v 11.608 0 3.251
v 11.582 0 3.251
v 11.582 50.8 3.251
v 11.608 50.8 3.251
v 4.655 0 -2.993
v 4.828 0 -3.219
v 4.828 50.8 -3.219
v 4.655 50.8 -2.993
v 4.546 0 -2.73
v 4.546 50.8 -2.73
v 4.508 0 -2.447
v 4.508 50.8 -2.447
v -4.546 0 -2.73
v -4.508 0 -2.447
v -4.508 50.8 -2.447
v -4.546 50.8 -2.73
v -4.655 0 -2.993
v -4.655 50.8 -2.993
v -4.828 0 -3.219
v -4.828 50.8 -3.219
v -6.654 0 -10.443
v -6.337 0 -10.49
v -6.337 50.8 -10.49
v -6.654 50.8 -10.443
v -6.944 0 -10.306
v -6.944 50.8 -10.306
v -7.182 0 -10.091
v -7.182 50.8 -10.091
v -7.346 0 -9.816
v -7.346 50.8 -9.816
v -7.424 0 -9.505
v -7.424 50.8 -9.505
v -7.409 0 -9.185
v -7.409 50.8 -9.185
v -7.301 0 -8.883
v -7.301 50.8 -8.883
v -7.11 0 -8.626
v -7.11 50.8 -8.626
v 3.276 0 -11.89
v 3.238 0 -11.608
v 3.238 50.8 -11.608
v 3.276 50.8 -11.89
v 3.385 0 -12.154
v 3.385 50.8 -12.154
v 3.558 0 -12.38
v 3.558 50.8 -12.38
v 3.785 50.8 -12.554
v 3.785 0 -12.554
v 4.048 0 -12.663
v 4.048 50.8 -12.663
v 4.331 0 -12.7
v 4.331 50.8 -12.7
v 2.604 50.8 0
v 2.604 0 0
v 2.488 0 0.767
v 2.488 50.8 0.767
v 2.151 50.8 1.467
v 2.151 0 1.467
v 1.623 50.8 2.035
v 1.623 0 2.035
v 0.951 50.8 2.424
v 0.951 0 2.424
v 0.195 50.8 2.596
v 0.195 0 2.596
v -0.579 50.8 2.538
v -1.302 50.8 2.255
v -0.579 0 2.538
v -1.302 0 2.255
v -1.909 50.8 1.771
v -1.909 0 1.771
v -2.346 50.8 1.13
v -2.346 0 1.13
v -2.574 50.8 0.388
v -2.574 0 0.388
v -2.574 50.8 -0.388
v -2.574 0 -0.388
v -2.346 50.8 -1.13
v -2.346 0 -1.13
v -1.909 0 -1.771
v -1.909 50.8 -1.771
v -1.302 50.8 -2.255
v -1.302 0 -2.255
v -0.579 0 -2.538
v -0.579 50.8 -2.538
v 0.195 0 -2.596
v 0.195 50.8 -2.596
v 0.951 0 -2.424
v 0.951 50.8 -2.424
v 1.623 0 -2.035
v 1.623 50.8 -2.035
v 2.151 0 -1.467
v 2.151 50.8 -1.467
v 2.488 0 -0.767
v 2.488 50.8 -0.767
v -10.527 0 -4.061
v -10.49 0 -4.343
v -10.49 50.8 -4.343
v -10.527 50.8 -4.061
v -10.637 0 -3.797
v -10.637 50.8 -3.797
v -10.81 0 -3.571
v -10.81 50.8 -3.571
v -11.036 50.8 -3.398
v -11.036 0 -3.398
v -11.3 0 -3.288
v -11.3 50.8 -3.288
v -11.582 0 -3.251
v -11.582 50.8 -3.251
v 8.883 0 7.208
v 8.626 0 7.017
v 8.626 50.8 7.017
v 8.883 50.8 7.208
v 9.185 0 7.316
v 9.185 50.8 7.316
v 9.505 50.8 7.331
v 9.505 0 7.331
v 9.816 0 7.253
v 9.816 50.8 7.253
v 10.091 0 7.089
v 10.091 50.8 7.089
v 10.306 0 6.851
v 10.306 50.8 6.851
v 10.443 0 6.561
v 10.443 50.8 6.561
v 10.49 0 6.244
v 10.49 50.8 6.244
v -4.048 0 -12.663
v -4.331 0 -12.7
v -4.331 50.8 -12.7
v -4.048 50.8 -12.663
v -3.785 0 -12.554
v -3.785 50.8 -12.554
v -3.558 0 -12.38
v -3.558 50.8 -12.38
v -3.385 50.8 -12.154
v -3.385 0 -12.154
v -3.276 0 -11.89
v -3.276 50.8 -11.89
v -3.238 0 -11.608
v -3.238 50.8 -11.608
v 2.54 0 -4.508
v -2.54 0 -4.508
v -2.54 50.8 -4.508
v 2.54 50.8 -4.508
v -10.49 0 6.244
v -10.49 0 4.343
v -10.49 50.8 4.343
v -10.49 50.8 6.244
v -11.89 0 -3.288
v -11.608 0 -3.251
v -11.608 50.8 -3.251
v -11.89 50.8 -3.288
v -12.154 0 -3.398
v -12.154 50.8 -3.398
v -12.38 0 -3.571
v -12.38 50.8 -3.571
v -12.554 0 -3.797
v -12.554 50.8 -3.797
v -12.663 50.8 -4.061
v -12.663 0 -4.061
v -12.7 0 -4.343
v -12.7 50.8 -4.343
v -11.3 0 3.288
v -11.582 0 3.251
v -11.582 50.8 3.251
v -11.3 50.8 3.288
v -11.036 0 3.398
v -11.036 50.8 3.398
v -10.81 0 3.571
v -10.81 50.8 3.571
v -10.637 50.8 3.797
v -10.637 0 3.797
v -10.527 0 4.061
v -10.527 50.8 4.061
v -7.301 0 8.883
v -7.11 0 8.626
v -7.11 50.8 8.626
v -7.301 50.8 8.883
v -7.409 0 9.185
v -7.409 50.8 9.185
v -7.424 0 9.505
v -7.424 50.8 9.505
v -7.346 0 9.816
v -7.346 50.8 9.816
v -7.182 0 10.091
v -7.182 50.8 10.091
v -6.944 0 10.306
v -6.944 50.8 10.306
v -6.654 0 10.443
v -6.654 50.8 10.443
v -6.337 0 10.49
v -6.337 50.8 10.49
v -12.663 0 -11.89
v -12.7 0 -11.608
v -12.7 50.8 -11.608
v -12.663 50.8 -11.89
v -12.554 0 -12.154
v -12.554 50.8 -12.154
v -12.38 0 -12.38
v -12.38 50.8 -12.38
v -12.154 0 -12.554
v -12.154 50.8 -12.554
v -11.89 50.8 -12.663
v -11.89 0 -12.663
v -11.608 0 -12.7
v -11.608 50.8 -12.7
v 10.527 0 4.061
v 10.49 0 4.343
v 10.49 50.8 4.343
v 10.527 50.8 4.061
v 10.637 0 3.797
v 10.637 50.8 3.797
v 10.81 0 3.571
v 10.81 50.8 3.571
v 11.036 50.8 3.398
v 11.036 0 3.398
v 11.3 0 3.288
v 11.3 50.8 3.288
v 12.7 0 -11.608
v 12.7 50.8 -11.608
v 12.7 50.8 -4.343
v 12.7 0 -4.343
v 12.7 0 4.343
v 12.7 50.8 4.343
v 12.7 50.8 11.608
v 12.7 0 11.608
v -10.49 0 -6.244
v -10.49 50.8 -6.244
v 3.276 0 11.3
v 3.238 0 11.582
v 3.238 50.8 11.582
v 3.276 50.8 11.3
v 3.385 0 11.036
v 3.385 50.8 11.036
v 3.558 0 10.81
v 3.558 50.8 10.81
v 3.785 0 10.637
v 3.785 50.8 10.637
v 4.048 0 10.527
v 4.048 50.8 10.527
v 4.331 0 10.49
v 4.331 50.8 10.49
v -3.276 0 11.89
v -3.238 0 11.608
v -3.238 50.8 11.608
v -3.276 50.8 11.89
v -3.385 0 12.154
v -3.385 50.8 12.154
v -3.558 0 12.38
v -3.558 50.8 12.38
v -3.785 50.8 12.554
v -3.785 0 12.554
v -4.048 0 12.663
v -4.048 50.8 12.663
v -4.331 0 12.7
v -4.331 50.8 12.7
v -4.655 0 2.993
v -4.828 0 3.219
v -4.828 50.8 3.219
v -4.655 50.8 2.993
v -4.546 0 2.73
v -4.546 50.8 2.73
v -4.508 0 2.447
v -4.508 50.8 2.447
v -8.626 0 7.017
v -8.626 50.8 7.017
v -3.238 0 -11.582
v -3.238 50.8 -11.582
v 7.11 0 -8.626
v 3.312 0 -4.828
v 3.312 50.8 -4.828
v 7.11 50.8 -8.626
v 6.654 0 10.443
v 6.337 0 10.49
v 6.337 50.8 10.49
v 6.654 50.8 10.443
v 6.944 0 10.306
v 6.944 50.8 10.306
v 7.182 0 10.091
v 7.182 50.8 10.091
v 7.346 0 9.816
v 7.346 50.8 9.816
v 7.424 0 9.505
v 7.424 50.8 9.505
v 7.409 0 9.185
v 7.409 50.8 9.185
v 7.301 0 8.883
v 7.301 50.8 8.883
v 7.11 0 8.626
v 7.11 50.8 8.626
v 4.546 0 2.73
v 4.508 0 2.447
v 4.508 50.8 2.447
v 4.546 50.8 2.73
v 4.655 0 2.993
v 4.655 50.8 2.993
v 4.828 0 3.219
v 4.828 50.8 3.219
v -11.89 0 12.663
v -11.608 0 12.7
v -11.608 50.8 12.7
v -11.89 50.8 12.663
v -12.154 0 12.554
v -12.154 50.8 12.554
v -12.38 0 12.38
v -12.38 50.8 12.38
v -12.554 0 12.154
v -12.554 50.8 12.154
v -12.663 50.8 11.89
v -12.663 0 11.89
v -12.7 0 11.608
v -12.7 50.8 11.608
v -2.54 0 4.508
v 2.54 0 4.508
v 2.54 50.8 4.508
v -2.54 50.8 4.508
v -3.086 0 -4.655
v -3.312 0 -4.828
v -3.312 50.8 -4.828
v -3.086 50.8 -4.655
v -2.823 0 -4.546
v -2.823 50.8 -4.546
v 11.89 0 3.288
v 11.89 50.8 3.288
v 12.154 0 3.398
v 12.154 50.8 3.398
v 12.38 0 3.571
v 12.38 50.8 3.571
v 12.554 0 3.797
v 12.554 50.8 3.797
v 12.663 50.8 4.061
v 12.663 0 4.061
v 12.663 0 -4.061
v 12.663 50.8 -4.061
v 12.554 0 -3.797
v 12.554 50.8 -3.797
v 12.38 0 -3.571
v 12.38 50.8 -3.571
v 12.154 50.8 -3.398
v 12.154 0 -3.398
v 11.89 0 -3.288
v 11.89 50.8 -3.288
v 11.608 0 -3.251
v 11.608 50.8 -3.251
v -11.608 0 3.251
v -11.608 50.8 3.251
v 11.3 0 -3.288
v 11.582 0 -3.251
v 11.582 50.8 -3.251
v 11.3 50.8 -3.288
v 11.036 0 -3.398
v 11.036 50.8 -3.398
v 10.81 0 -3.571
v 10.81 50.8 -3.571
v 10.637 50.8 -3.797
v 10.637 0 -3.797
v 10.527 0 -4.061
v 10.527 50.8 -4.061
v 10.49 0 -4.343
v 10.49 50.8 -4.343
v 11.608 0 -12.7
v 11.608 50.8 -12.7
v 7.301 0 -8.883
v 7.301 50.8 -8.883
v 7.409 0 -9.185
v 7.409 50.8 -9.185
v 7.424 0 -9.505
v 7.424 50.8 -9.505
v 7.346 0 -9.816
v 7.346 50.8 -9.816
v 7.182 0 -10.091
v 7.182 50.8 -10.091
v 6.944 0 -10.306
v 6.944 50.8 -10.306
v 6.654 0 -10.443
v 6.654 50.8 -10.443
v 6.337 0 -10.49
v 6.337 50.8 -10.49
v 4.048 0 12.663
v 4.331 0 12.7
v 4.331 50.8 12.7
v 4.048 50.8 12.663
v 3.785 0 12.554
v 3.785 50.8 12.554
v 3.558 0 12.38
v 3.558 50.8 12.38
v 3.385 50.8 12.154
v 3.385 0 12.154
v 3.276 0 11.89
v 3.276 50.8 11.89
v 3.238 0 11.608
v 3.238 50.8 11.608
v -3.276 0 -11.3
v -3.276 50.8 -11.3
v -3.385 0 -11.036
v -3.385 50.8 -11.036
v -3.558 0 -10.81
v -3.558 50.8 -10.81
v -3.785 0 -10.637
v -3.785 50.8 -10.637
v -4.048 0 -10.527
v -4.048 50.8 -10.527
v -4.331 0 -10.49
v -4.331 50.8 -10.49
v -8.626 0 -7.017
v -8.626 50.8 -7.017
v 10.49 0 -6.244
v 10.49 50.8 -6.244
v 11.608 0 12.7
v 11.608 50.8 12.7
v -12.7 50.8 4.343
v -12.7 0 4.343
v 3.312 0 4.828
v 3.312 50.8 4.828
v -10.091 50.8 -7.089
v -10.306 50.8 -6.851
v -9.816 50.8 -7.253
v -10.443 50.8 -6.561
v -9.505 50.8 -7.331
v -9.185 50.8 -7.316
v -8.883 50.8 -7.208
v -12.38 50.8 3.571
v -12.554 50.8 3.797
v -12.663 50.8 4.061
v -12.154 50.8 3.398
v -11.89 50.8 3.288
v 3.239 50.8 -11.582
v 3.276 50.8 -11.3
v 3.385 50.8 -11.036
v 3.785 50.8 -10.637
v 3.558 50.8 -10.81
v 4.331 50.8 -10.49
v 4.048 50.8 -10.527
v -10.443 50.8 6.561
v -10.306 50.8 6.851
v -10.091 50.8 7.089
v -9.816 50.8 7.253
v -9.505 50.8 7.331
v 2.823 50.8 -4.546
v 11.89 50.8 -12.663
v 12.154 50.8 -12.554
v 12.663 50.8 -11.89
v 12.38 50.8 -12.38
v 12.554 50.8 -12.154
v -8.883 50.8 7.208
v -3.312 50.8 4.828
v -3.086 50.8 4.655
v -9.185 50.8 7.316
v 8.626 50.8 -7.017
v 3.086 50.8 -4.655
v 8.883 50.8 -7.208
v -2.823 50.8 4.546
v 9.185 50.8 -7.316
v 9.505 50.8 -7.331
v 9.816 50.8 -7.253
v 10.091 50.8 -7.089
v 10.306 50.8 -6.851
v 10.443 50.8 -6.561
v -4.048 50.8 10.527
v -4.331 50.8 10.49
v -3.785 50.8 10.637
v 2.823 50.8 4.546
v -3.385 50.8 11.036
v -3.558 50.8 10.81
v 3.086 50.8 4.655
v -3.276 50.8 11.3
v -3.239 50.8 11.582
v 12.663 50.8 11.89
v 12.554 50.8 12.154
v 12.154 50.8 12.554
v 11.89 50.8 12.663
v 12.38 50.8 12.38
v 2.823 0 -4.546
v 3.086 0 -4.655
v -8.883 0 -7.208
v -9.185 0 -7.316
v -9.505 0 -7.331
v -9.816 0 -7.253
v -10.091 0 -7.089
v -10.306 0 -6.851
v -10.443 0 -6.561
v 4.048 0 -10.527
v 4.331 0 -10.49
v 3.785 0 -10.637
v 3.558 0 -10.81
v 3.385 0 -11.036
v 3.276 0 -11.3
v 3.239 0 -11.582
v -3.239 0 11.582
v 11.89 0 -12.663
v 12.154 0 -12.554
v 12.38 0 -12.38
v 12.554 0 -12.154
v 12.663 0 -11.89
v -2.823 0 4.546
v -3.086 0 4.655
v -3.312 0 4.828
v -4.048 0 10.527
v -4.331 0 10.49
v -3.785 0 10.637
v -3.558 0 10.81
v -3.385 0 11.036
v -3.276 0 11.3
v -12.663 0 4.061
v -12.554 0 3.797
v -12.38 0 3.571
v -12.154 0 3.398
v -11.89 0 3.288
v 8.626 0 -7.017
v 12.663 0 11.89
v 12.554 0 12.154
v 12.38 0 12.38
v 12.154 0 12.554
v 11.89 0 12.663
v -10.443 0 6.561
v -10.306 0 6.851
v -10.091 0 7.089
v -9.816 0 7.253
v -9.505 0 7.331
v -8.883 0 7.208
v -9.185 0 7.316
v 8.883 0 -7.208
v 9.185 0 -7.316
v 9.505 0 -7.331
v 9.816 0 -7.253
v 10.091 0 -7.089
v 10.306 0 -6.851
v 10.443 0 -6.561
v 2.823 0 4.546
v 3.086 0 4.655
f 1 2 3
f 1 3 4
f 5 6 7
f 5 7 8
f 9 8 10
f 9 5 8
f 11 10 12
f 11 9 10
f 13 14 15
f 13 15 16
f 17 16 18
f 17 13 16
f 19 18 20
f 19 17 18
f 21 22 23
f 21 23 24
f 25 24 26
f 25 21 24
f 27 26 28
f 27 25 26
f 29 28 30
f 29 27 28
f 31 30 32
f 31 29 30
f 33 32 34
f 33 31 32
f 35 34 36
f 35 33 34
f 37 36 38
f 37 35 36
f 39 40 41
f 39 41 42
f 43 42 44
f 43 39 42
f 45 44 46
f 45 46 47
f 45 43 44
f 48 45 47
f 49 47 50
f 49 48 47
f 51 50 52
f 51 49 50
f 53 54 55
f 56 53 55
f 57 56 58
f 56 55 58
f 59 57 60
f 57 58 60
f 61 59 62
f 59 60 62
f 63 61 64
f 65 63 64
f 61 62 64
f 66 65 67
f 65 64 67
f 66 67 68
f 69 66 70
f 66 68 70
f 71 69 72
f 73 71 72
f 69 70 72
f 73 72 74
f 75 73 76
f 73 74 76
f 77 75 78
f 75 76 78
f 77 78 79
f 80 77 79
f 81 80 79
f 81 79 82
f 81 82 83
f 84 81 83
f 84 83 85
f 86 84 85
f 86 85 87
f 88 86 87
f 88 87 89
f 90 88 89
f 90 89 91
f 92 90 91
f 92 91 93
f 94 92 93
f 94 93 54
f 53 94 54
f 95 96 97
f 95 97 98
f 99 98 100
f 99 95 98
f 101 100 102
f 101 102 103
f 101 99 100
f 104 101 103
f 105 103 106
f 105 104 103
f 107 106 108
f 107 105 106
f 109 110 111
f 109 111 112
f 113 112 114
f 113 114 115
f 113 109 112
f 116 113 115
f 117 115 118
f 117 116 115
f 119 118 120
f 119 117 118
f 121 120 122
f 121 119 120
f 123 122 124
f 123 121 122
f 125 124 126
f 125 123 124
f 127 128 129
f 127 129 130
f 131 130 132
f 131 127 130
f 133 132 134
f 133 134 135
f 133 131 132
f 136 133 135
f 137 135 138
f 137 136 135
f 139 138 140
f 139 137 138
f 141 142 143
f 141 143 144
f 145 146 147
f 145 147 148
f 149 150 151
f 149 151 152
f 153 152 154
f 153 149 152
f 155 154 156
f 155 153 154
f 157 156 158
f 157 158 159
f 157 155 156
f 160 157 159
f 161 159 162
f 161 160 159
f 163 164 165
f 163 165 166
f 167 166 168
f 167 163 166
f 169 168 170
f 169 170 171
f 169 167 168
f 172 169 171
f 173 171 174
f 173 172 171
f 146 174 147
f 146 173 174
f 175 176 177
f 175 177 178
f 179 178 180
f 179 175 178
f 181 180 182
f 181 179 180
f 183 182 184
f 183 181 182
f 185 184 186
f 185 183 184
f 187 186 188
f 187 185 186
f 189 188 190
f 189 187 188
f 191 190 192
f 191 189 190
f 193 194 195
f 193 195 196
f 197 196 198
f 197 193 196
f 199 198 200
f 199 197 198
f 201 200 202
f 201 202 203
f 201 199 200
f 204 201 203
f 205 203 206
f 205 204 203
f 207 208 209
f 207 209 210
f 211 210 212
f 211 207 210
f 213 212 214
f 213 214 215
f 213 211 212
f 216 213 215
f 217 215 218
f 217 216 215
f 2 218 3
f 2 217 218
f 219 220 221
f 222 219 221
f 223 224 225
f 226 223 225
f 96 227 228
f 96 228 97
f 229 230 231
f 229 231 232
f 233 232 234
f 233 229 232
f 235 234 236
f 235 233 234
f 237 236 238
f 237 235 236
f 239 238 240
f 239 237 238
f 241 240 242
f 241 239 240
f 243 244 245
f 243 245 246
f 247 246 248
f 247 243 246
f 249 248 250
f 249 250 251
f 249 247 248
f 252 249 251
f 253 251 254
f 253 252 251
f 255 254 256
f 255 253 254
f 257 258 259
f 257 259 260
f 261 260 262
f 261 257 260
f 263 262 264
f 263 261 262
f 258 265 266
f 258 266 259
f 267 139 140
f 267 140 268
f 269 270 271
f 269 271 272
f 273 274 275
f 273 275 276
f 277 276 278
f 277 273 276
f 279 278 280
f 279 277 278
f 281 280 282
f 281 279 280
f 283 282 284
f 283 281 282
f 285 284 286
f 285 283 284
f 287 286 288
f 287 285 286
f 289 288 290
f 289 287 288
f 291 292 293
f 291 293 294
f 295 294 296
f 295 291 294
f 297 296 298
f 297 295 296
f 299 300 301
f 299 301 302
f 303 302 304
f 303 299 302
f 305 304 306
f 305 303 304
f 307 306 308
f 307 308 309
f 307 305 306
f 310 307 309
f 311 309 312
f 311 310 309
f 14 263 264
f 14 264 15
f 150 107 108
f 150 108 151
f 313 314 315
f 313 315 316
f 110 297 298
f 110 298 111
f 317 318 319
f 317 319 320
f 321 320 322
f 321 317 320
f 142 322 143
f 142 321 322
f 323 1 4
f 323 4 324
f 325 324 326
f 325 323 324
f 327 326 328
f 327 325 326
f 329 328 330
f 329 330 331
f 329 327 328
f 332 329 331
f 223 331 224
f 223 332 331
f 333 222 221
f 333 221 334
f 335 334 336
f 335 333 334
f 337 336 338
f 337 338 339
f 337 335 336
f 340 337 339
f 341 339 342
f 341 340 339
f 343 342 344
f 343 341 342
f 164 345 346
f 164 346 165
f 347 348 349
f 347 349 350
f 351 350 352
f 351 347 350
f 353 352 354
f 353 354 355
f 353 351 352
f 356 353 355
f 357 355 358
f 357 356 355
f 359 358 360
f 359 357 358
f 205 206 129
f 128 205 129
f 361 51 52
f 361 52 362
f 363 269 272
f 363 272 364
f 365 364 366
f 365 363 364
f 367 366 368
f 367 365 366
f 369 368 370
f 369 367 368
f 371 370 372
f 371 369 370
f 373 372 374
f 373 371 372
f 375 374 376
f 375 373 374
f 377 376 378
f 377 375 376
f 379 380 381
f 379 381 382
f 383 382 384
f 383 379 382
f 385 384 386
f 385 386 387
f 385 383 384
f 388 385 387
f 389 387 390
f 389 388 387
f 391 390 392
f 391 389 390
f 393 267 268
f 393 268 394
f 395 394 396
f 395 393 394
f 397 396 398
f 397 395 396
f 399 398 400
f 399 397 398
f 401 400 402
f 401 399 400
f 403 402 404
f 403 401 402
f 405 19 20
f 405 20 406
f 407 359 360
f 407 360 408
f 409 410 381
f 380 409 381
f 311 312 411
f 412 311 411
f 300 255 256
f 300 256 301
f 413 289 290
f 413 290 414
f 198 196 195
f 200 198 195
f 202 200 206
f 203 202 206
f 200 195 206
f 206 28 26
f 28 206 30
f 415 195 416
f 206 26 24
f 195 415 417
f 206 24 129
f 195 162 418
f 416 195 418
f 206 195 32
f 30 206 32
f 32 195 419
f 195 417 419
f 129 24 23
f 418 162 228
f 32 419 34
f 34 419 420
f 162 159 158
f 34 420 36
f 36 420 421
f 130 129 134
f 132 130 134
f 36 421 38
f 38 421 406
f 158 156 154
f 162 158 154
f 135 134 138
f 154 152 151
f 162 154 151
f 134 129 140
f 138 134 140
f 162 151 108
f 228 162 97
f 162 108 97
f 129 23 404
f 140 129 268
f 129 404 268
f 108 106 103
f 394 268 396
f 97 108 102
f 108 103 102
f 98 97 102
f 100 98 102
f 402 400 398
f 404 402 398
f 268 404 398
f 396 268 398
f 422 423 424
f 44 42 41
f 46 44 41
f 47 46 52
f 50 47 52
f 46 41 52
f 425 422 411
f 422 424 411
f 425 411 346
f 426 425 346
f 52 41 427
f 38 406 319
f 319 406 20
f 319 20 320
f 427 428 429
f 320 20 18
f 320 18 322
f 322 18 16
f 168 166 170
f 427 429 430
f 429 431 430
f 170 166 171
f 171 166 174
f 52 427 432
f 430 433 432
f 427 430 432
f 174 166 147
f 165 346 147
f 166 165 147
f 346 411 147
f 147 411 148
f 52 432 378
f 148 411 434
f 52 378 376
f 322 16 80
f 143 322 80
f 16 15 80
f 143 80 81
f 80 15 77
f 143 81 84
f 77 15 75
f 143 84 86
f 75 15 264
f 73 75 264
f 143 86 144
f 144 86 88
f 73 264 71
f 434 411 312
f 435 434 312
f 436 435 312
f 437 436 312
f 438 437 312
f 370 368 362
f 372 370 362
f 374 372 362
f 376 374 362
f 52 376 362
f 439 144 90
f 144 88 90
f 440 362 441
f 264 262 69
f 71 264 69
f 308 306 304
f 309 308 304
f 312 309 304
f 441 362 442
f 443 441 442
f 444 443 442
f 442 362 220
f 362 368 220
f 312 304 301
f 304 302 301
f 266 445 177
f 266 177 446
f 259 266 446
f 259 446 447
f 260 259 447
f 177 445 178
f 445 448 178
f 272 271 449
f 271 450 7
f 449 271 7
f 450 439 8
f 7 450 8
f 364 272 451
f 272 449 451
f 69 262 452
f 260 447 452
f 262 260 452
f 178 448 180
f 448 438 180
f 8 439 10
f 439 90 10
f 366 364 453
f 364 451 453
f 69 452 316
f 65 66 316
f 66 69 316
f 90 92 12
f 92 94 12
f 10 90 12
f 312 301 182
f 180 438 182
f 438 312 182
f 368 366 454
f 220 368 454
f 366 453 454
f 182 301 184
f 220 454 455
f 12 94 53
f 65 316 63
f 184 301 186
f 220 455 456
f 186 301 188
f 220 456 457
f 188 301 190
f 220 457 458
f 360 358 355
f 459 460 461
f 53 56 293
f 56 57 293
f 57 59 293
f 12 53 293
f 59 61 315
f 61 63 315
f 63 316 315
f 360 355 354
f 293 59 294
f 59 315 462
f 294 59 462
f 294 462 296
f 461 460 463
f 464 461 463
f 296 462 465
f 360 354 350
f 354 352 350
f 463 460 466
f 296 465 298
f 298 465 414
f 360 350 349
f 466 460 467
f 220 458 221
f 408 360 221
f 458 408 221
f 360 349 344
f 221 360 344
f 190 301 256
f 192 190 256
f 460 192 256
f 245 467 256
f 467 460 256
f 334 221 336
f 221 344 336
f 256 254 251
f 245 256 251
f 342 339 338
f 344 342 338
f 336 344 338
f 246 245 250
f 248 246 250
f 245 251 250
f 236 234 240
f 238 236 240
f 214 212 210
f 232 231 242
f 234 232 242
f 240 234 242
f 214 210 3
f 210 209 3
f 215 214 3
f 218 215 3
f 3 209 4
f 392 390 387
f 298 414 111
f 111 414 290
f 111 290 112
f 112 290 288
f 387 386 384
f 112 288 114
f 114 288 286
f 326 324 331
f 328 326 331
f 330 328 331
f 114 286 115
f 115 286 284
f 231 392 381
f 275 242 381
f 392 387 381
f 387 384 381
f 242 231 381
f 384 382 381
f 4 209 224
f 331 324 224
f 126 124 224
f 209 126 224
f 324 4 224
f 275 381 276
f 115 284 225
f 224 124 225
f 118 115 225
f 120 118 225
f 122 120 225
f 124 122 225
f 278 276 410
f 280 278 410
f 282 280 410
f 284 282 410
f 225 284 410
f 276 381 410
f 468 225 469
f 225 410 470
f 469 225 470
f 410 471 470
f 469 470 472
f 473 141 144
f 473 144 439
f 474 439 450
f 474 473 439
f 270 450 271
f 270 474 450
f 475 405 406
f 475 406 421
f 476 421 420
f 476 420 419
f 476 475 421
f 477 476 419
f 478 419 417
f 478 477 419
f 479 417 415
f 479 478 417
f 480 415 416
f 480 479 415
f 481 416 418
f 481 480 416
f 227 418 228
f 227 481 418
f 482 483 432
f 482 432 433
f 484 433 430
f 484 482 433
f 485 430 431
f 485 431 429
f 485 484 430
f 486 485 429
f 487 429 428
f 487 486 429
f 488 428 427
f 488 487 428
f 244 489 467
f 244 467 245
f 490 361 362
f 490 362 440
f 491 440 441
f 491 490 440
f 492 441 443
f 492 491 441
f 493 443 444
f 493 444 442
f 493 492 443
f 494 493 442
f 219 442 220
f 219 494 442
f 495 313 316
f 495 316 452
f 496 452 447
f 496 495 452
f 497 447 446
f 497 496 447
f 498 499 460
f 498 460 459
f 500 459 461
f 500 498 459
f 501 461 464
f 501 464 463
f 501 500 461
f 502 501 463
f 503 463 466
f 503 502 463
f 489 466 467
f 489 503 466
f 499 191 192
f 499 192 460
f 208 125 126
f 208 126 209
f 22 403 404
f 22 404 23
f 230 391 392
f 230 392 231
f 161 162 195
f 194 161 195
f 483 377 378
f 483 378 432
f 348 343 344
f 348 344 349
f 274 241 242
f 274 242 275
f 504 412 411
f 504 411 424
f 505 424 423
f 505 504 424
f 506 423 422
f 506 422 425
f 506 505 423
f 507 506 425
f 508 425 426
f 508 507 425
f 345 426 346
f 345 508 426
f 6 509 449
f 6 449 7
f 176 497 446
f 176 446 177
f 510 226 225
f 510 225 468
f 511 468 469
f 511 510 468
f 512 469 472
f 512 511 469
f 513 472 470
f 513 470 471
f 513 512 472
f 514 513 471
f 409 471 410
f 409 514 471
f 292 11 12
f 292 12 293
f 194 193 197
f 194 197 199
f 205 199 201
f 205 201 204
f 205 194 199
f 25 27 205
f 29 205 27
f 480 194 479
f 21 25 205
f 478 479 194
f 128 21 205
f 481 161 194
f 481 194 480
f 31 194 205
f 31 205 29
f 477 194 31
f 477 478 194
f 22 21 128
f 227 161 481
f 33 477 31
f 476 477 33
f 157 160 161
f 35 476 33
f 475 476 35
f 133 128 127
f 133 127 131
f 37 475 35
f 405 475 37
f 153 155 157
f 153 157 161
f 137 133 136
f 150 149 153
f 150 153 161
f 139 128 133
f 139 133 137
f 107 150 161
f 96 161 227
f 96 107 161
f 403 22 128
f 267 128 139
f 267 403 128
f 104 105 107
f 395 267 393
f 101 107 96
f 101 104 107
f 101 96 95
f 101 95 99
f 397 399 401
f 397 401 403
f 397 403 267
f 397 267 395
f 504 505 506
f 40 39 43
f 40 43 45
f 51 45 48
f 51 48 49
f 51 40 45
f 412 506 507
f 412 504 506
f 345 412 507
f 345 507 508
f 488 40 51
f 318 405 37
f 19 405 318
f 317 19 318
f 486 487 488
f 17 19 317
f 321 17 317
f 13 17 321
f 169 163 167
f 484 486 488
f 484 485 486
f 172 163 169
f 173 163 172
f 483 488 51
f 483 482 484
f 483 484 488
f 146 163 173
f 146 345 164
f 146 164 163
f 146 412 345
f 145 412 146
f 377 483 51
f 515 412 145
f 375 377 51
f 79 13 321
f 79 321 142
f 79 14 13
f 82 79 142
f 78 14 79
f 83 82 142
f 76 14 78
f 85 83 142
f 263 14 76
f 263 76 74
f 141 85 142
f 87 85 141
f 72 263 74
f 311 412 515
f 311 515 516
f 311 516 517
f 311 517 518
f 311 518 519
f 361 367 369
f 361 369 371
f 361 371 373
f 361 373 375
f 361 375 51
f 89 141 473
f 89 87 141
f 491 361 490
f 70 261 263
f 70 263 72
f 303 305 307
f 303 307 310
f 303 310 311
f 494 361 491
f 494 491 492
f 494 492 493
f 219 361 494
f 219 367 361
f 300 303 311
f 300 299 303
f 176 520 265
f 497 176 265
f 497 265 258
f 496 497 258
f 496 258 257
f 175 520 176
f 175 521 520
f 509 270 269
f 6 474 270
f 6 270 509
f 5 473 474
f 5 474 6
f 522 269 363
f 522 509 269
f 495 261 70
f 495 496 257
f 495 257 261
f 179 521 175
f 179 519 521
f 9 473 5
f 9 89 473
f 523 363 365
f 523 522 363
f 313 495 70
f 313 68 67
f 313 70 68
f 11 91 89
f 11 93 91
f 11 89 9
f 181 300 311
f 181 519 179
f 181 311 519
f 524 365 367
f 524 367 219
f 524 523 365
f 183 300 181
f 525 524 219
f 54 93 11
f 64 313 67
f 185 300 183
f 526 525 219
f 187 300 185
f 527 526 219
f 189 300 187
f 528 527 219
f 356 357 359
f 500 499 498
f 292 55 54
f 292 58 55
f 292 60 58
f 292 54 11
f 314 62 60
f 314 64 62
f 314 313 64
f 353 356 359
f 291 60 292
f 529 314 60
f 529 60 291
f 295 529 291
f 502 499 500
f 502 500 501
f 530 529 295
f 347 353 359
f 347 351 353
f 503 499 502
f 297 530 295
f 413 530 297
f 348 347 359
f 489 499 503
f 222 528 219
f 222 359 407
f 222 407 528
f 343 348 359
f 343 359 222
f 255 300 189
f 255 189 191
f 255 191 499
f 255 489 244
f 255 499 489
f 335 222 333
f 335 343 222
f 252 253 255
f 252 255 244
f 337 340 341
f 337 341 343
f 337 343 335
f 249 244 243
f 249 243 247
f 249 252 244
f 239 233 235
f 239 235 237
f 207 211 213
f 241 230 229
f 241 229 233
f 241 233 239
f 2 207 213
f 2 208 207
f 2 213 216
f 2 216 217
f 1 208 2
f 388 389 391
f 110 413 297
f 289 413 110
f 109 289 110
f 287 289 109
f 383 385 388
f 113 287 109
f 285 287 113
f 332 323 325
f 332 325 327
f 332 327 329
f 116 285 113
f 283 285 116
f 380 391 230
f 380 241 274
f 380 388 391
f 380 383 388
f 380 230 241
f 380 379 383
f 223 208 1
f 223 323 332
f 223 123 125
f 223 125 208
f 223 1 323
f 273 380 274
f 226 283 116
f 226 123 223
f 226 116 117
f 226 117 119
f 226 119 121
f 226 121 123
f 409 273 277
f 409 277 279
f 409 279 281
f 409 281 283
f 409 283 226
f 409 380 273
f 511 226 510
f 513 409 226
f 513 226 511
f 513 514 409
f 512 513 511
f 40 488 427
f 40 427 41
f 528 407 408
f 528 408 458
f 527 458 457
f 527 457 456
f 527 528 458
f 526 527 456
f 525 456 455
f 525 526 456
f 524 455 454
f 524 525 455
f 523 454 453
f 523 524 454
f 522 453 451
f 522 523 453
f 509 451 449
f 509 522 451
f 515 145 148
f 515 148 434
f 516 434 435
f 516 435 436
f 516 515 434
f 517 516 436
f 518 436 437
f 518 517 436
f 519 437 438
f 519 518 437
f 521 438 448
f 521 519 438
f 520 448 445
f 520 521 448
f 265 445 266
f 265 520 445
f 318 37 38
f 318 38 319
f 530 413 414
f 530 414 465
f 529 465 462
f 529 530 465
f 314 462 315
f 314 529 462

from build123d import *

# Parameters (mm, degrees)
F1_DEPTH = 50.8
F2_R     = 2.6035
F3_DEPTH = 50.801


with BuildPart() as f1:
    # F0 (on Front) → F1 (new body)
    with BuildSketch(Plane.XZ):
        with BuildLine():
            Line((-4.5085, 0), (0, 0))
            Line((0, 0), (0, 4.5085))
            Line((0, 4.5085), (-2.54, 4.5085))
            ThreePointArc((-2.54, 4.5085), (-2.957967, 4.591639), (-3.312302, 4.828398))
            Line((-3.312302, 4.828398), (-7.109602, 8.625698))
            ThreePointArc((-7.109602, 8.625698), (-7.346361, 9.815967), (-6.3373, 10.4902))
            Line((-6.3373, 10.4902), (-4.3307, 10.4902))
            ThreePointArc((-4.3307, 10.4902), (-3.558398, 10.810098), (-3.2385, 11.5824))
            Line((-3.2385, 11.5824), (-3.2385, 11.6078))
            ThreePointArc((-3.2385, 11.6078), (-3.558398, 12.380102), (-4.3307, 12.7))
            Line((-4.3307, 12.7), (-11.6078, 12.7))
            ThreePointArc((-11.6078, 12.7), (-12.380102, 12.380102), (-12.7, 11.6078))
            Line((-12.7, 11.6078), (-12.7, 4.3434))
            ThreePointArc((-12.7, 4.3434), (-12.380102, 3.571098), (-11.6078, 3.2512))
            Line((-11.6078, 3.2512), (-11.5824, 3.2512))
            ThreePointArc((-11.5824, 3.2512), (-10.810098, 3.571098), (-10.4902, 4.3434))
            Line((-10.4902, 4.3434), (-10.4902, 6.244363))
            ThreePointArc((-10.4902, 6.244363), (-9.815967, 7.253424), (-8.625698, 7.016665))
            Line((-8.625698, 7.016665), (-4.828398, 3.219365))
            ThreePointArc((-4.828398, 3.219365), (-4.591639, 2.86503), (-4.5085, 2.447063))
            Line((-4.5085, 2.447063), (-4.5085, 0))
        make_face()
        with BuildLine():
            Line((0, 4.5085), (0, 0))
            Line((0, 0), (4.5085, 0))
            Line((4.5085, 0), (4.5085, 2.447063))
            ThreePointArc((4.5085, 2.447063), (4.591639, 2.86503), (4.828398, 3.219365))
            Line((4.828398, 3.219365), (8.625698, 7.016665))
            ThreePointArc((8.625698, 7.016665), (9.815967, 7.253424), (10.4902, 6.244363))
            Line((10.4902, 6.244363), (10.4902, 4.3434))
            ThreePointArc((10.4902, 4.3434), (10.810098, 3.571098), (11.5824, 3.2512))
            Line((11.5824, 3.2512), (11.6078, 3.2512))
            ThreePointArc((11.6078, 3.2512), (12.380102, 3.571098), (12.7, 4.3434))
            Line((12.7, 4.3434), (12.7, 11.6078))
            ThreePointArc((12.7, 11.6078), (12.380102, 12.380102), (11.6078, 12.7))
            Line((11.6078, 12.7), (4.3307, 12.7))
            ThreePointArc((4.3307, 12.7), (3.558398, 12.380102), (3.2385, 11.6078))
            Line((3.2385, 11.6078), (3.2385, 11.5824))
            ThreePointArc((3.2385, 11.5824), (3.558398, 10.810098), (4.3307, 10.4902))
            Line((4.3307, 10.4902), (6.3373, 10.4902))
            ThreePointArc((6.3373, 10.4902), (7.346361, 9.815967), (7.109602, 8.625698))
            Line((7.109602, 8.625698), (3.312302, 4.828398))
            ThreePointArc((3.312302, 4.828398), (2.957967, 4.591639), (2.54, 4.5085))
            Line((2.54, 4.5085), (0, 4.5085))
        make_face()
        with BuildLine():
            Line((4.5085, 0), (0, 0))
            Line((0, 0), (0, -4.5085))
            Line((0, -4.5085), (2.54, -4.5085))
            ThreePointArc((2.54, -4.5085), (2.957967, -4.591639), (3.312302, -4.828398))
            Line((3.312302, -4.828398), (7.109602, -8.625698))
            ThreePointArc((7.109602, -8.625698), (7.346361, -9.815967), (6.3373, -10.4902))
            Line((6.3373, -10.4902), (4.3307, -10.4902))
            ThreePointArc((4.3307, -10.4902), (3.558398, -10.810098), (3.2385, -11.5824))
            Line((3.2385, -11.5824), (3.2385, -11.6078))
            ThreePointArc((3.2385, -11.6078), (3.558398, -12.380102), (4.3307, -12.7))
            Line((4.3307, -12.7), (11.6078, -12.7))
            ThreePointArc((11.6078, -12.7), (12.380102, -12.380102), (12.7, -11.6078))
            Line((12.7, -11.6078), (12.7, -4.3434))
            ThreePointArc((12.7, -4.3434), (12.380102, -3.571098), (11.6078, -3.2512))
            Line((11.6078, -3.2512), (11.5824, -3.2512))
            ThreePointArc((11.5824, -3.2512), (10.810098, -3.571098), (10.4902, -4.3434))
            Line((10.4902, -4.3434), (10.4902, -6.244363))
            ThreePointArc((10.4902, -6.244363), (9.815967, -7.253424), (8.625698, -7.016665))
            Line((8.625698, -7.016665), (4.828398, -3.219365))
            ThreePointArc((4.828398, -3.219365), (4.591639, -2.86503), (4.5085, -2.447063))
            Line((4.5085, -2.447063), (4.5085, 0))
        make_face()
        with BuildLine():
            Line((0, -4.5085), (0, 0))
            Line((0, 0), (-4.5085, 0))
            Line((-4.5085, 0), (-4.5085, -2.447063))
            ThreePointArc((-4.5085, -2.447063), (-4.591639, -2.86503), (-4.828398, -3.219365))
            Line((-4.828398, -3.219365), (-8.625698, -7.016665))
            ThreePointArc((-8.625698, -7.016665), (-9.815967, -7.253424), (-10.4902, -6.244363))
            Line((-10.4902, -6.244363), (-10.4902, -4.3434))
            ThreePointArc((-10.4902, -4.3434), (-10.810098, -3.571098), (-11.5824, -3.2512))
            Line((-11.5824, -3.2512), (-11.6078, -3.2512))
            ThreePointArc((-11.6078, -3.2512), (-12.380102, -3.571098), (-12.7, -4.3434))
            Line((-12.7, -4.3434), (-12.7, -11.6078))
            ThreePointArc((-12.7, -11.6078), (-12.380102, -12.380102), (-11.6078, -12.7))
            Line((-11.6078, -12.7), (-4.3307, -12.7))
            ThreePointArc((-4.3307, -12.7), (-3.558398, -12.380102), (-3.2385, -11.6078))
            Line((-3.2385, -11.6078), (-3.2385, -11.5824))
            ThreePointArc((-3.2385, -11.5824), (-3.558398, -10.810098), (-4.3307, -10.4902))
            Line((-4.3307, -10.4902), (-6.3373, -10.4902))
            ThreePointArc((-6.3373, -10.4902), (-7.346361, -9.815967), (-7.109602, -8.625698))
            Line((-7.109602, -8.625698), (-3.312302, -4.828398))
            ThreePointArc((-3.312302, -4.828398), (-2.957967, -4.591639), (-2.54, -4.5085))
            Line((-2.54, -4.5085), (0, -4.5085))
        make_face()
    extrude(amount=-F1_DEPTH)

    # F2 (on face) → F3 (cut, through all)
    with BuildSketch(Plane.XZ):
        Circle(F2_R)
    extrude(amount=-F3_DEPTH, mode=Mode.SUBTRACT)


solid = f1.part
